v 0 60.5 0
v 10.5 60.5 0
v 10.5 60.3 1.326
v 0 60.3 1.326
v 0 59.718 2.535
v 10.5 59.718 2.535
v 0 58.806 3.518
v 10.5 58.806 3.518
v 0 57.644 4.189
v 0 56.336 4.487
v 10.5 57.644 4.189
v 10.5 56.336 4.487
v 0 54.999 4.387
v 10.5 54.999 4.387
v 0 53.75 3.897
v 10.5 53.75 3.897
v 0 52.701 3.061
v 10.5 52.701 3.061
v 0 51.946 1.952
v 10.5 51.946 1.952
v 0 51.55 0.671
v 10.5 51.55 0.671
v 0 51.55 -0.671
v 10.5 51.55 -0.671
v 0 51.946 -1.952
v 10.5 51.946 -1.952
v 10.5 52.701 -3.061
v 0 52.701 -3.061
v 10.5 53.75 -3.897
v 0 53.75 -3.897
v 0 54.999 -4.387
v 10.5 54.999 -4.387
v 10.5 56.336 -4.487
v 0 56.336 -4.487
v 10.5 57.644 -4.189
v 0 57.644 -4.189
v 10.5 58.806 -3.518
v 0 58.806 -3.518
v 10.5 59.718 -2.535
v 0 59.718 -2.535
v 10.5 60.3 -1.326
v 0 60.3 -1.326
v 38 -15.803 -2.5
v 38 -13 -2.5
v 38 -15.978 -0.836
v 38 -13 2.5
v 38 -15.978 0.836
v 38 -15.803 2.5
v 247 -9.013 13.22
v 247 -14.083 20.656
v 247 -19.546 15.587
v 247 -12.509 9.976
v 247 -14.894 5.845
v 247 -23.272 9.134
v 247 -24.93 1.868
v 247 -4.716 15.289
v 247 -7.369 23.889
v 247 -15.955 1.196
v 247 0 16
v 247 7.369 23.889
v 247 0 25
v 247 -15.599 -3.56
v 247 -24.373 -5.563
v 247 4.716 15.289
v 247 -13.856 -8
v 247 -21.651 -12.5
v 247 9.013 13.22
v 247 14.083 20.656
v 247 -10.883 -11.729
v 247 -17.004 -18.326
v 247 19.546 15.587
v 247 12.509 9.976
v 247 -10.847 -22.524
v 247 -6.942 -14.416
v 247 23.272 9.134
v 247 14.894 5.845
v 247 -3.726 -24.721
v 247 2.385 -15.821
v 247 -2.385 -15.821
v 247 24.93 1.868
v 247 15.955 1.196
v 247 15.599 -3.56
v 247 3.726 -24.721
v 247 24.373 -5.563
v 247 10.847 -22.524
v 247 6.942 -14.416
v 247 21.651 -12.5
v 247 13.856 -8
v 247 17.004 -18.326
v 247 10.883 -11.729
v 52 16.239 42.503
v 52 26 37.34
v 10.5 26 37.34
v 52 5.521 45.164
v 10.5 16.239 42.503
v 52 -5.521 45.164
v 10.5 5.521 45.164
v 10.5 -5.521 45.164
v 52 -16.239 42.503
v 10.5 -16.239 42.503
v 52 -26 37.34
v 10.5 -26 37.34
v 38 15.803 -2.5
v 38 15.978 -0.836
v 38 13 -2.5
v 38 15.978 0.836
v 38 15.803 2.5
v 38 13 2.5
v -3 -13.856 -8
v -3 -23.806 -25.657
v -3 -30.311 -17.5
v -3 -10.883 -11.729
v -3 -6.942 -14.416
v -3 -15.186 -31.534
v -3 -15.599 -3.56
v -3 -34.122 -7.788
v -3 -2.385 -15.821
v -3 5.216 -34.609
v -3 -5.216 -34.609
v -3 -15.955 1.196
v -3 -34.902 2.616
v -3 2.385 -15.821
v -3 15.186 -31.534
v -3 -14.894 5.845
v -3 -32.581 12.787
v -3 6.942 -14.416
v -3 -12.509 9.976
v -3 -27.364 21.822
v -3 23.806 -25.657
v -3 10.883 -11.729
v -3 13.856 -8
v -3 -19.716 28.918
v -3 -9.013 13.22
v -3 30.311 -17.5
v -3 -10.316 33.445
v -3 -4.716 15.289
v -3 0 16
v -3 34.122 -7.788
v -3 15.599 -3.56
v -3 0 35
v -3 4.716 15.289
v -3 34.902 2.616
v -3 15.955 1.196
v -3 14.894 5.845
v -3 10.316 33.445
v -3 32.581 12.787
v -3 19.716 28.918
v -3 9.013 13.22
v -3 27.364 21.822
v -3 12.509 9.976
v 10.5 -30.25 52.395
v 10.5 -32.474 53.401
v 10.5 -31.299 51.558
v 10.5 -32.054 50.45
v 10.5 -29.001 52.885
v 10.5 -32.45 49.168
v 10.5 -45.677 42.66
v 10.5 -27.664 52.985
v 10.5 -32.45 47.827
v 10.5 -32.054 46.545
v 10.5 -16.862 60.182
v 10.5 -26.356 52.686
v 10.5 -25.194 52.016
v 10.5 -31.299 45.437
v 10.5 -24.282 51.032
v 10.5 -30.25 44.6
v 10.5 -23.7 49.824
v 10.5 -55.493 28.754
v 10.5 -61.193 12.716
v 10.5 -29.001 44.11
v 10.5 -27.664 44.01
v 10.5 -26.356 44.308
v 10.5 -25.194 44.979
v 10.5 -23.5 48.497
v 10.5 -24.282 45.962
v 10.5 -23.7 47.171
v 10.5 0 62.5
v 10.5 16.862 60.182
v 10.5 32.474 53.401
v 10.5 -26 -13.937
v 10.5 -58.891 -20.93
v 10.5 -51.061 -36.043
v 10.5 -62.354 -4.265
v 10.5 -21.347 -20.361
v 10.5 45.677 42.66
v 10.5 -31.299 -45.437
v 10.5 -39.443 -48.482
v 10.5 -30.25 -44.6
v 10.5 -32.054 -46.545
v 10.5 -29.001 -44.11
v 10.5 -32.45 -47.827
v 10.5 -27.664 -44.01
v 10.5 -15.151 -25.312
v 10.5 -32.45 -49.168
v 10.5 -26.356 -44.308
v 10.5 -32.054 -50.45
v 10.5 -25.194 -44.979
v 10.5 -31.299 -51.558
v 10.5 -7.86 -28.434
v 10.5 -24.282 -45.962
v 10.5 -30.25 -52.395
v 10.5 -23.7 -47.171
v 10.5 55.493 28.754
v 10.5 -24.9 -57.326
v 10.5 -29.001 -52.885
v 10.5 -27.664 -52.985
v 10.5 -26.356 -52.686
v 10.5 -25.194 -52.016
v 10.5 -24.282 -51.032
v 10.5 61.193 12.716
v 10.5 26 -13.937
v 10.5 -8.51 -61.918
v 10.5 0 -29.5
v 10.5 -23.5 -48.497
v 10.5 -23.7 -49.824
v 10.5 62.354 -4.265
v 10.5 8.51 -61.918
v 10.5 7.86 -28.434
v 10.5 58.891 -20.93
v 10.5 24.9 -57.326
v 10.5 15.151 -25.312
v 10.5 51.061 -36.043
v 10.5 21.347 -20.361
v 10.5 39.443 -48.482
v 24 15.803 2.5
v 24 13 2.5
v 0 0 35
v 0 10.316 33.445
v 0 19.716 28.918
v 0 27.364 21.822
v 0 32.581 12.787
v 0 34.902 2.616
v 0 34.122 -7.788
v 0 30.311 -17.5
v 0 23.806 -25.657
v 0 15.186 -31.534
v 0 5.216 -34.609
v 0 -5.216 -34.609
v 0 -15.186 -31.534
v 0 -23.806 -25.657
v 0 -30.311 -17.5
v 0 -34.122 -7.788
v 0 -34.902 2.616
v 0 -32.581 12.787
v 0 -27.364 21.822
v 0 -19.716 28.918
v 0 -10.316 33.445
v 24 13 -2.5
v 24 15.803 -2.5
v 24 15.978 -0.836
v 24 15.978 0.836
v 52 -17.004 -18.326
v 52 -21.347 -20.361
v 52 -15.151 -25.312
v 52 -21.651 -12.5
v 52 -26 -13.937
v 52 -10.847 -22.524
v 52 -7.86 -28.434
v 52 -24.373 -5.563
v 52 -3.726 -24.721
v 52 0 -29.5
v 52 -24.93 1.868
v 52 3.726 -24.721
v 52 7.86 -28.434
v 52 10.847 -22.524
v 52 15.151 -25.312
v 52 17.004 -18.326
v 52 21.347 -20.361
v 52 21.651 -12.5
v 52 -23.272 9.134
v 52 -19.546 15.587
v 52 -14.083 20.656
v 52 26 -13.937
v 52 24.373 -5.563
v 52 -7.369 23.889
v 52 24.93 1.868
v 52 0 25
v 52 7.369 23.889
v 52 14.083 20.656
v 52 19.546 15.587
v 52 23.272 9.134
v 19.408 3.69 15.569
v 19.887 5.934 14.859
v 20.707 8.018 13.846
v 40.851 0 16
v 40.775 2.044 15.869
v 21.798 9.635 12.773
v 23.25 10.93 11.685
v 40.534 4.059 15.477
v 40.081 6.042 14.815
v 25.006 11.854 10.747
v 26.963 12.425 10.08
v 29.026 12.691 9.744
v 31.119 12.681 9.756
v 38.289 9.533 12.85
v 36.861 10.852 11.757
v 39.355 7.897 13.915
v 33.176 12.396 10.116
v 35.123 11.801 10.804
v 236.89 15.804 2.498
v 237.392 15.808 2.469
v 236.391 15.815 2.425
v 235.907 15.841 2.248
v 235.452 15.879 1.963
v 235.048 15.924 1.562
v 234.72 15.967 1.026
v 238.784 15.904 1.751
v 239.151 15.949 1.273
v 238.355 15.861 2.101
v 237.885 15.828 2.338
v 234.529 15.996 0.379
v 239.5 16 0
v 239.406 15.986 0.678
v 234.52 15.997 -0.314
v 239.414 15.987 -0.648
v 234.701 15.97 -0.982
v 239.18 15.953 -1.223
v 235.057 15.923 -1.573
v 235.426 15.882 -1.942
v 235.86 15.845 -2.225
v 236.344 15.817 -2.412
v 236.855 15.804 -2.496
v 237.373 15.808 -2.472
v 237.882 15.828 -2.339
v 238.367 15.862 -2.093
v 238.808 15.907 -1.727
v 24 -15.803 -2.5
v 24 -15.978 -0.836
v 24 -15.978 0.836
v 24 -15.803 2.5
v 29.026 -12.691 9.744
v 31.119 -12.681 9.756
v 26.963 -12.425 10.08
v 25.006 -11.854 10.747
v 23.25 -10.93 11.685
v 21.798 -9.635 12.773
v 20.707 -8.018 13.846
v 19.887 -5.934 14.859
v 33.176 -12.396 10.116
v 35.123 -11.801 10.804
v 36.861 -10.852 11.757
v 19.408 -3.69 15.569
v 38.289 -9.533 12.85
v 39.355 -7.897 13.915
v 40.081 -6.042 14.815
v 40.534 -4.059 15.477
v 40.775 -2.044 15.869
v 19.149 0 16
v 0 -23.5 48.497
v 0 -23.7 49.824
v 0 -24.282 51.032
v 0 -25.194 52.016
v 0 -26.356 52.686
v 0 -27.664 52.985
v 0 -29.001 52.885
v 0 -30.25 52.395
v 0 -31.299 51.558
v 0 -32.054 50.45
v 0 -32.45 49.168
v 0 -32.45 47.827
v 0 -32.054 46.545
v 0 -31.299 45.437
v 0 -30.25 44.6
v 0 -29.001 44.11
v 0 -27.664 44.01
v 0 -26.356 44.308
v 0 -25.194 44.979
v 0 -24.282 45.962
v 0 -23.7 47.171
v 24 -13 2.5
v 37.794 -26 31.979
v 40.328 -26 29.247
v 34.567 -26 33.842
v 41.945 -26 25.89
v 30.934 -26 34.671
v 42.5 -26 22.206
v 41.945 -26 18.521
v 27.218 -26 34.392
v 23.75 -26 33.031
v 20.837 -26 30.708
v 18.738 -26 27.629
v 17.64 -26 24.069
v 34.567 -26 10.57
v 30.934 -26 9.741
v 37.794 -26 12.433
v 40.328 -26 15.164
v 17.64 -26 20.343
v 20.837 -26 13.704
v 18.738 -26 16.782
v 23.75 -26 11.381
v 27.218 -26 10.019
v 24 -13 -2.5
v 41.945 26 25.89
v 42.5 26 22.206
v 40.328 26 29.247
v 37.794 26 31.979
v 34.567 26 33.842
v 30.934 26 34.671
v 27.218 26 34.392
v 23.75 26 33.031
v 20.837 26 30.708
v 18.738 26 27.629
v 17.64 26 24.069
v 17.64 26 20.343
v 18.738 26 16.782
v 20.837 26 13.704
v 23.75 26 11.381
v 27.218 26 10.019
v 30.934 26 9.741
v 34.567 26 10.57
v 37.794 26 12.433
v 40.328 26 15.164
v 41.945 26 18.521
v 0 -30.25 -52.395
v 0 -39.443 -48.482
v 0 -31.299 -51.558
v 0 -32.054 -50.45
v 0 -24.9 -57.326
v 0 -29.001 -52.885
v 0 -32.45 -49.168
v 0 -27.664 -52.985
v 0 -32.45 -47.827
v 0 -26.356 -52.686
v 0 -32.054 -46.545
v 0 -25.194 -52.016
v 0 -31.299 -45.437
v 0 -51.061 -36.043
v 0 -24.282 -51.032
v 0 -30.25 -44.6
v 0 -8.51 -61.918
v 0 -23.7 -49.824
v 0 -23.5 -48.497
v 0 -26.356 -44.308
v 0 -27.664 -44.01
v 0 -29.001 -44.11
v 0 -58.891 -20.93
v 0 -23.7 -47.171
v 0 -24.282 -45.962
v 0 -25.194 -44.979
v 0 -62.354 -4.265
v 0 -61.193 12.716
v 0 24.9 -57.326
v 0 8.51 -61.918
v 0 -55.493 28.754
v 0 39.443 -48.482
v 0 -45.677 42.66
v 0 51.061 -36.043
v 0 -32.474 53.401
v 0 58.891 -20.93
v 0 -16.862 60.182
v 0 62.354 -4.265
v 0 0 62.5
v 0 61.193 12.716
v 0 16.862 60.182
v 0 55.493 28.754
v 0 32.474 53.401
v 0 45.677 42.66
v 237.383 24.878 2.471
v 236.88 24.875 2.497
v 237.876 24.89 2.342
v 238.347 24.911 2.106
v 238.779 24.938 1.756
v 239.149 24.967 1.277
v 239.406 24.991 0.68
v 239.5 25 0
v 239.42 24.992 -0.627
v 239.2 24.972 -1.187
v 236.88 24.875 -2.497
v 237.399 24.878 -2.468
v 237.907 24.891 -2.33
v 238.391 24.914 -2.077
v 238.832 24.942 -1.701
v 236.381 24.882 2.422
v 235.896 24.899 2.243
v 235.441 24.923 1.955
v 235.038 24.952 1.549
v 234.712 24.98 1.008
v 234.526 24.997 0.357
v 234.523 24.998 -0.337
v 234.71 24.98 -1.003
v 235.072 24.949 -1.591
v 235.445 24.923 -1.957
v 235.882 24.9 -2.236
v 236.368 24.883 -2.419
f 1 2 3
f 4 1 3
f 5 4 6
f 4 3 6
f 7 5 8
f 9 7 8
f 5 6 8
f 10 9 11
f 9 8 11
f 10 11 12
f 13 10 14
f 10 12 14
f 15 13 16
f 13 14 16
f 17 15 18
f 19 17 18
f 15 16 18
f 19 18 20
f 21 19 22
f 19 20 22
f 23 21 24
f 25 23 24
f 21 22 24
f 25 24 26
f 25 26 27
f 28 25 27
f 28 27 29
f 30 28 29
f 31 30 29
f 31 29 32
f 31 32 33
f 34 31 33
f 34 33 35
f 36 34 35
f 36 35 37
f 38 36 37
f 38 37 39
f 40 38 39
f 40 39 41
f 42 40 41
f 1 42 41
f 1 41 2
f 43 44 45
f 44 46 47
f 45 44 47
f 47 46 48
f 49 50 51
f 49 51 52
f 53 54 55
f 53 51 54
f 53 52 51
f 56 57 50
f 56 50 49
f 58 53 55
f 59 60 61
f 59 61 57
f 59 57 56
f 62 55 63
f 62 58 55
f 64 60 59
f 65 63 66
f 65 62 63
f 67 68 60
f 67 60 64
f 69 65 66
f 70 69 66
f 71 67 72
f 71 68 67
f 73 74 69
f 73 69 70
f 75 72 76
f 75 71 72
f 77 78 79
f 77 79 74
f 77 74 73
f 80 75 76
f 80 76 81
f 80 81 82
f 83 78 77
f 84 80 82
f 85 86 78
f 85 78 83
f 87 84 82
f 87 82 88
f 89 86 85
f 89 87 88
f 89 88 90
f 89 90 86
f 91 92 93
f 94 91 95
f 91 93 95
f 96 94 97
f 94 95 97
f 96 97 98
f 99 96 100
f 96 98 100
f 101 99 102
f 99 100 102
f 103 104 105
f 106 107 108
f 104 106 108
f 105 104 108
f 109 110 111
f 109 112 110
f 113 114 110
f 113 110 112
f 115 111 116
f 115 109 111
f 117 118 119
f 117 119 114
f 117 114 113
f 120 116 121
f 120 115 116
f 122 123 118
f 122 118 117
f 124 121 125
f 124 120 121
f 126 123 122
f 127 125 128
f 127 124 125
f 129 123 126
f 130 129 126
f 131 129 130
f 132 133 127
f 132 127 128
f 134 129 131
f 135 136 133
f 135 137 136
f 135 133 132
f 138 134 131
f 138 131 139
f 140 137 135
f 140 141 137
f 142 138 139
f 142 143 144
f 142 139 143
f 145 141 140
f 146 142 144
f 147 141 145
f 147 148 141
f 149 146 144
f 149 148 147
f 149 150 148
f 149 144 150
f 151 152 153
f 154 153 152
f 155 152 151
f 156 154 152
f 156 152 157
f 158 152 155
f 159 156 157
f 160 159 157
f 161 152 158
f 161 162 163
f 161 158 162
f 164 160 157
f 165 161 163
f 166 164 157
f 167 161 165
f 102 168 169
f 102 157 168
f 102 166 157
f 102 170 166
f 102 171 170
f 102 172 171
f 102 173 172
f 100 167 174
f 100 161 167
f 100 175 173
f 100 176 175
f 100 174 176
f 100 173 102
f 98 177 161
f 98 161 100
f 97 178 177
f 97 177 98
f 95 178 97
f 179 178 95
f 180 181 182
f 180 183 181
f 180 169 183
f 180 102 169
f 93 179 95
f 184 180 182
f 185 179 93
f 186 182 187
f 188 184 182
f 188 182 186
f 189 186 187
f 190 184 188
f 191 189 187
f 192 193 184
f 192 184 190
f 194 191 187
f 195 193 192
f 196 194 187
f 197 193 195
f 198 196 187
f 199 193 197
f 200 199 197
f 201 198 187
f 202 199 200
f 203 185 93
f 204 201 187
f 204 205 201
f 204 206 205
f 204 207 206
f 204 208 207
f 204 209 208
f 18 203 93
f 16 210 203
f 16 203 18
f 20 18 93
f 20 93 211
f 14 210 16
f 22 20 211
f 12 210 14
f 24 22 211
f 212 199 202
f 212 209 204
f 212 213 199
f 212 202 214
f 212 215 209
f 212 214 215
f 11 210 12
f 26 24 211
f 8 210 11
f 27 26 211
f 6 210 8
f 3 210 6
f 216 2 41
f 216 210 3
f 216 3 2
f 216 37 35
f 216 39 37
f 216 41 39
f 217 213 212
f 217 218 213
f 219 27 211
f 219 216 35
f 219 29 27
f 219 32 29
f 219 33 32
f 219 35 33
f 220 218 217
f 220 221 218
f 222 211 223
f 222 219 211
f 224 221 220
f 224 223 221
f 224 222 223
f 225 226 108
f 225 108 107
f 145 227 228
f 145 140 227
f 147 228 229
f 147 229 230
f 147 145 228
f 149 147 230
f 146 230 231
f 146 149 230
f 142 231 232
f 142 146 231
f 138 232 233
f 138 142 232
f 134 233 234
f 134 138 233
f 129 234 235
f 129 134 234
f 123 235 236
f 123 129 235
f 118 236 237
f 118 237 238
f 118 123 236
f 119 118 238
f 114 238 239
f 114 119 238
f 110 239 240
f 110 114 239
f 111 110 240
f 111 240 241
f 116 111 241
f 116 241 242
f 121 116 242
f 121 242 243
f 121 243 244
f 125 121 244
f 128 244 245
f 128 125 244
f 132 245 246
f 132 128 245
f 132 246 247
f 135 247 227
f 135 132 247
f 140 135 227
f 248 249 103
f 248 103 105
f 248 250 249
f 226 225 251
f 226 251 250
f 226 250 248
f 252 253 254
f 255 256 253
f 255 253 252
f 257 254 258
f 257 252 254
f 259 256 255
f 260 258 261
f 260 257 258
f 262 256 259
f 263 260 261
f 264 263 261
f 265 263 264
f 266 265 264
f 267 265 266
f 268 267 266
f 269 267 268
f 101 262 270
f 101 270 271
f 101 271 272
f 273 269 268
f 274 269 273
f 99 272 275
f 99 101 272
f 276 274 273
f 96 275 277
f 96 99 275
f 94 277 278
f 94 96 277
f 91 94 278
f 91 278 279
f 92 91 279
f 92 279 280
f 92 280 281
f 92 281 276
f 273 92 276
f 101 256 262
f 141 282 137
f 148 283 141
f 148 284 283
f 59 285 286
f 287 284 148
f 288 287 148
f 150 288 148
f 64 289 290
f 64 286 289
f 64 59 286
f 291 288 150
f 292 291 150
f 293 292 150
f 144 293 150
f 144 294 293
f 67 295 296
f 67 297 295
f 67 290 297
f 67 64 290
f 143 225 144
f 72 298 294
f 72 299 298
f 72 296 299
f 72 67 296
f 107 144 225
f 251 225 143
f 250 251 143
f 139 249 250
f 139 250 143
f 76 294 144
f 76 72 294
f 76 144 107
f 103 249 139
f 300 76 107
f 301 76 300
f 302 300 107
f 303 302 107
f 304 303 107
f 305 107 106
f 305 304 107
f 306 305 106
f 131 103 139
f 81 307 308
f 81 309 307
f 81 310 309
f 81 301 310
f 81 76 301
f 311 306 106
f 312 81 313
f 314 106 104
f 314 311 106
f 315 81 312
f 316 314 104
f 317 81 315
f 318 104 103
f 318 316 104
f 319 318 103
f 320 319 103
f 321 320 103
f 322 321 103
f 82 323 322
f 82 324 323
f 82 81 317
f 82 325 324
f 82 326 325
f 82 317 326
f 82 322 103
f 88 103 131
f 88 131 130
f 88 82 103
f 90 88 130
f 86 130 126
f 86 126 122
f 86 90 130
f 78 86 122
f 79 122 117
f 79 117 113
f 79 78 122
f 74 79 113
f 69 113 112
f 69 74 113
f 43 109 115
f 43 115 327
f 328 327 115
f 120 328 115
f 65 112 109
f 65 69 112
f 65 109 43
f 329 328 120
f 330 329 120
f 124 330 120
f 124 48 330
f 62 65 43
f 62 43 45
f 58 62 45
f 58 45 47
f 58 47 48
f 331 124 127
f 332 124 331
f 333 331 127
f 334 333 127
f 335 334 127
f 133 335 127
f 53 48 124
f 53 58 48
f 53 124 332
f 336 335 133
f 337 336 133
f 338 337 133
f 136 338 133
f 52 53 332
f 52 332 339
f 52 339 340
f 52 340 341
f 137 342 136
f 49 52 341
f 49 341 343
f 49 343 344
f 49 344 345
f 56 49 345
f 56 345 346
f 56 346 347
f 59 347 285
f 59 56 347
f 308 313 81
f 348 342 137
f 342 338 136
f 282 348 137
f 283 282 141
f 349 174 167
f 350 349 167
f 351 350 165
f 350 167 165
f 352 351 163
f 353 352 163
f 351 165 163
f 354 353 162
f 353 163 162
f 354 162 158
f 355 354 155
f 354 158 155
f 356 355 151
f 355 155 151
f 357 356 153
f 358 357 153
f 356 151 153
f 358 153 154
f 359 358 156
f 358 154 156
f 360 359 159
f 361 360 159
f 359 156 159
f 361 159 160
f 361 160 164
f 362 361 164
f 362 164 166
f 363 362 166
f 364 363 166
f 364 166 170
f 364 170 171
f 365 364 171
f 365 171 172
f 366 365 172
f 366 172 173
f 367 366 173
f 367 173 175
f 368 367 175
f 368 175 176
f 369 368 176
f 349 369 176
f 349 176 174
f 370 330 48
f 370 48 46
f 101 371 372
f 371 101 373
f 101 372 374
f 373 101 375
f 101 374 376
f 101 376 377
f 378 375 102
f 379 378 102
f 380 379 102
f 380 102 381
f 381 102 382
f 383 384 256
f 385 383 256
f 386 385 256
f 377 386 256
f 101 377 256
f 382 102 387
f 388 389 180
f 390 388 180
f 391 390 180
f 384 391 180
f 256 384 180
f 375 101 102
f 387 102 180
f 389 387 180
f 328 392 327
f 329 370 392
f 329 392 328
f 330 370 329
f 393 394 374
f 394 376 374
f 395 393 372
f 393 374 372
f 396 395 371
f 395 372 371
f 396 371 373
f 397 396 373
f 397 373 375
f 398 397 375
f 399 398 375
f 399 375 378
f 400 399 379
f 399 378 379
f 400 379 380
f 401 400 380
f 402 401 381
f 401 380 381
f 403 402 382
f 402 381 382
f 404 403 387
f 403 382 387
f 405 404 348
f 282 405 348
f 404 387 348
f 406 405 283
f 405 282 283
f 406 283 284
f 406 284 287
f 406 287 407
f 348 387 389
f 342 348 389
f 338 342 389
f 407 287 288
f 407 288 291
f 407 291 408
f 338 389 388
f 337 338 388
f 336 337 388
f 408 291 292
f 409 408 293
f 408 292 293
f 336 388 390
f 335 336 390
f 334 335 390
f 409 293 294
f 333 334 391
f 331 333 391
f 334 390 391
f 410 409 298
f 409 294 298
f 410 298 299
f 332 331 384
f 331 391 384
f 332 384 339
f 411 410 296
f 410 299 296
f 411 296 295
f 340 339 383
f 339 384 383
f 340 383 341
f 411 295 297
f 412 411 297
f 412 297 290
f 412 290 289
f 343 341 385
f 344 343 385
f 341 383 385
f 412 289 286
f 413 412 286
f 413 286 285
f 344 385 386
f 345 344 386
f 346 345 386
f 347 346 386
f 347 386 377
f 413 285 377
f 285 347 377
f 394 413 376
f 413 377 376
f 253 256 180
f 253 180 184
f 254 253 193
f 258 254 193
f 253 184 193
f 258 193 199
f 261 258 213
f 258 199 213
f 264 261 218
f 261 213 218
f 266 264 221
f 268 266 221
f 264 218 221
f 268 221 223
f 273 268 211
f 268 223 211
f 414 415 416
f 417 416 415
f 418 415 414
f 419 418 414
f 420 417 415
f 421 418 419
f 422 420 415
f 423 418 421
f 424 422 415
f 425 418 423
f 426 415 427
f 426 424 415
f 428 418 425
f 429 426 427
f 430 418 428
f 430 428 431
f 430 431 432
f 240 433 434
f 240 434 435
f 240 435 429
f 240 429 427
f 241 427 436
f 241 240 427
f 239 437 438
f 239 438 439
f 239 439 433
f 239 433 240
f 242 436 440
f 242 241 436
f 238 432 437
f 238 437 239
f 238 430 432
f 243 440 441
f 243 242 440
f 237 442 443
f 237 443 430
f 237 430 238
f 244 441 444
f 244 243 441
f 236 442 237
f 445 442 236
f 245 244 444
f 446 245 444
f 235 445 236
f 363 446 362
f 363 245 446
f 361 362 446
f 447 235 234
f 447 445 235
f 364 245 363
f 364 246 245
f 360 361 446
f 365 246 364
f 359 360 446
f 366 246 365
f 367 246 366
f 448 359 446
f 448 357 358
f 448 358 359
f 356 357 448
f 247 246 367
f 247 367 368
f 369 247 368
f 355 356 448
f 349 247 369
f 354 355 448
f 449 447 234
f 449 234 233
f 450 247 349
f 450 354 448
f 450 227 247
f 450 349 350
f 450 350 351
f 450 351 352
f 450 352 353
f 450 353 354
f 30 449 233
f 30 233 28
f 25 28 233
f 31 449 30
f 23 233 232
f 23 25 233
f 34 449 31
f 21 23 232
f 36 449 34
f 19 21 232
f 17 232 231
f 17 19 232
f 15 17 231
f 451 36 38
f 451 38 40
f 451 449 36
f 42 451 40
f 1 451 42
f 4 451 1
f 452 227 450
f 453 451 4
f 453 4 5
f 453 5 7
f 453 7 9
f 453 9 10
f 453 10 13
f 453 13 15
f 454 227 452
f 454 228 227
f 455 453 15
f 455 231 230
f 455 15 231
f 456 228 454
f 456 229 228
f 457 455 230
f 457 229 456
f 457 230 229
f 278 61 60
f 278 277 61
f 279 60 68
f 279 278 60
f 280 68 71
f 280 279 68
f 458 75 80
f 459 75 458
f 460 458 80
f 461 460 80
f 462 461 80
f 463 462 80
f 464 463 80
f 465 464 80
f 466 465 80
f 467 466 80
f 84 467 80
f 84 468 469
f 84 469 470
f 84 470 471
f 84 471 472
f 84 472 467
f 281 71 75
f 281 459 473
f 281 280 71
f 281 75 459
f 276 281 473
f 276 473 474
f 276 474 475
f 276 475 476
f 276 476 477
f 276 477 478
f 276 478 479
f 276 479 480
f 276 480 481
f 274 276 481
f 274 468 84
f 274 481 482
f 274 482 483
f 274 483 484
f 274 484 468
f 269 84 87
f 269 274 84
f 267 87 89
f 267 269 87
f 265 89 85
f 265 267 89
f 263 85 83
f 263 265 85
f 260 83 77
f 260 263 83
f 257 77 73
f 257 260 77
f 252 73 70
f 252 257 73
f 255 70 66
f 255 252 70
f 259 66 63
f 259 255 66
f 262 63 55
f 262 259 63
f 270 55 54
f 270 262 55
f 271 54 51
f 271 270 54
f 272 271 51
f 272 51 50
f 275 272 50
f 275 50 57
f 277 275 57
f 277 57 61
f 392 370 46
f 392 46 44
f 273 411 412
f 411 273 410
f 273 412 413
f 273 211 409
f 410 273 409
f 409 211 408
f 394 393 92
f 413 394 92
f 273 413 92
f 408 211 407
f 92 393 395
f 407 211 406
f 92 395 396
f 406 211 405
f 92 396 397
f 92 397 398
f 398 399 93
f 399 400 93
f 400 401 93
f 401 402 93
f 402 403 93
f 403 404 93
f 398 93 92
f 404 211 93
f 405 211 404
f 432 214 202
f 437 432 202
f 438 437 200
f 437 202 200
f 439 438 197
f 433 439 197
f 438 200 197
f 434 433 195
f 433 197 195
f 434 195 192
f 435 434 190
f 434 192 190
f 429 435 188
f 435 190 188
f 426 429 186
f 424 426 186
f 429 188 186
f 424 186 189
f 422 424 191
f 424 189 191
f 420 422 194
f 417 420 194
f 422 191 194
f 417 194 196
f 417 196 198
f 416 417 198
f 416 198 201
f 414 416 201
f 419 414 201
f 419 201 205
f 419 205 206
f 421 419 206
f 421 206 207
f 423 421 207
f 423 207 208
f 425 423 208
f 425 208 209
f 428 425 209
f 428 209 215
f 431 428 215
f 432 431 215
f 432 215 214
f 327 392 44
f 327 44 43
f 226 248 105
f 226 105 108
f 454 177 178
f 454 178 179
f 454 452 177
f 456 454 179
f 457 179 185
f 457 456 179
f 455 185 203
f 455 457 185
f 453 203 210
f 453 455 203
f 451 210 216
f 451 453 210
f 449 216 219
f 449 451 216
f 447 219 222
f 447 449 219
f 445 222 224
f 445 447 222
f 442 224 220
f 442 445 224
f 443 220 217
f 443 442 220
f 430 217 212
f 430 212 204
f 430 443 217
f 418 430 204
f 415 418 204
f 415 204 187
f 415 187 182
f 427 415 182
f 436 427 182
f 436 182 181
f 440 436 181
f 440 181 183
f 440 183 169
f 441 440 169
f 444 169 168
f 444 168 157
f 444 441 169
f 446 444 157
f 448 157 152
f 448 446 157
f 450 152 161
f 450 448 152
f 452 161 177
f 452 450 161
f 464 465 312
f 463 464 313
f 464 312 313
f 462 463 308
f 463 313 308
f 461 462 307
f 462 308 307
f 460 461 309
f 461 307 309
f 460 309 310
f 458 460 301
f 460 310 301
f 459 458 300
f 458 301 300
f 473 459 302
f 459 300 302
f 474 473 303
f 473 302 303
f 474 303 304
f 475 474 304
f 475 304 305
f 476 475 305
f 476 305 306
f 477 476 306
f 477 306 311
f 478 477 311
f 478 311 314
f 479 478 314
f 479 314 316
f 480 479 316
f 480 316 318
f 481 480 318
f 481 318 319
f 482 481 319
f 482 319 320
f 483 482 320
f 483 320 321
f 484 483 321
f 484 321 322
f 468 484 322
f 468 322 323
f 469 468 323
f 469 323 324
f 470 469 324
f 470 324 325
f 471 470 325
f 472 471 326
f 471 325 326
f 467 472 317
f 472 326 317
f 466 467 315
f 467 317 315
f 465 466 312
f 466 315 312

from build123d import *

# Parameters (mm, degrees)
F2_R      = 25
F3_DEPTH  = 41.5
F4_R      = 12.5
F5_DEPTH  = 30
F6_R      = 2.5
F7_DEPTH  = 62.501
F8_R      = 4.5
F9_DEPTH  = 13.5010001
F12_DEPTH = 14


with BuildPart() as f1:
    # F0 (on Front) → F1 (revolve)
    with BuildSketch(Plane.XZ):
        Polygon((10.5, 62.5), (0, 62.5), (0, 35), (-3, 35), (-3, 16), (247, 16), (247, 25), (10.5, 25), align=None)
    revolve(axis=Axis((-11.2489545718, 0, 0), (-1, 0, 0)))

    # F2 (on face) → F3 (join)
    with BuildSketch(Plane.YZ.offset(10.5)):
        with BuildLine():
            Line((26, -13.9373598648), (26, 37.3396572025))
            ThreePointArc((26, 37.3396572025), (0, 45.5), (-26, 37.3396572025))
            Line((-26, 37.3396572025), (-26, -13.9373598648))
            ThreePointArc((-26, -13.9373598648), (0, -29.5), (26, -13.9373598648))
        make_face()
        Circle(F2_R, mode=Mode.SUBTRACT)
    extrude(amount=F3_DEPTH)

    # F4 (on Front) → F5 (cut, symmetric)
    with BuildSketch(Plane.XZ):
        with Locations((30, 22.2058613113)):
            Circle(F4_R)
    extrude(amount=F5_DEPTH, both=True, mode=Mode.SUBTRACT)

    # F6 (on Front) → F7 (cut, through all)
    with BuildSketch(Plane.XZ):
        with Locations((237, 0)):
            Circle(F6_R)
    extrude(amount=-F7_DEPTH, mode=Mode.SUBTRACT)

    # F8 (on face) → F9 (cut, through all)
    with BuildSketch(Plane.YZ.offset(10.5)):
        with Locations((-28, 48.4974226119)):
            Circle(F8_R)
        with Locations((56, 0)):
            Circle(F8_R)
        with Locations((-28, -48.4974226119)):
            Circle(F8_R)
    extrude(amount=-F9_DEPTH, mode=Mode.SUBTRACT)

    # F11 (on offset) → F12 (join)
    with BuildSketch(Plane(origin=(24, 0, 0), x_dir=(0, -1, 0), z_dir=(-1, 0, 0))):
        with BuildLine():
            Line((-13, 2.5), (-15.8034806293, 2.5))
            ThreePointArc((-15.8034806293, 2.5), (-16, 0), (-15.8034806293, -2.5))
            Line((-15.8034806293, -2.5), (-13, -2.5))
            Line((-13, -2.5), (-13, 2.5))
        make_face()
        with BuildLine():
            ThreePointArc((15.8034806293, -2.5), (16, 0), (15.8034806293, 2.5))
            Line((15.8034806293, 2.5), (13, 2.5))
            Line((13, 2.5), (13, -2.5))
            Line((13, -2.5), (15.8034806293, -2.5))
        make_face()
    extrude(amount=-F12_DEPTH)


solid = f1.part
